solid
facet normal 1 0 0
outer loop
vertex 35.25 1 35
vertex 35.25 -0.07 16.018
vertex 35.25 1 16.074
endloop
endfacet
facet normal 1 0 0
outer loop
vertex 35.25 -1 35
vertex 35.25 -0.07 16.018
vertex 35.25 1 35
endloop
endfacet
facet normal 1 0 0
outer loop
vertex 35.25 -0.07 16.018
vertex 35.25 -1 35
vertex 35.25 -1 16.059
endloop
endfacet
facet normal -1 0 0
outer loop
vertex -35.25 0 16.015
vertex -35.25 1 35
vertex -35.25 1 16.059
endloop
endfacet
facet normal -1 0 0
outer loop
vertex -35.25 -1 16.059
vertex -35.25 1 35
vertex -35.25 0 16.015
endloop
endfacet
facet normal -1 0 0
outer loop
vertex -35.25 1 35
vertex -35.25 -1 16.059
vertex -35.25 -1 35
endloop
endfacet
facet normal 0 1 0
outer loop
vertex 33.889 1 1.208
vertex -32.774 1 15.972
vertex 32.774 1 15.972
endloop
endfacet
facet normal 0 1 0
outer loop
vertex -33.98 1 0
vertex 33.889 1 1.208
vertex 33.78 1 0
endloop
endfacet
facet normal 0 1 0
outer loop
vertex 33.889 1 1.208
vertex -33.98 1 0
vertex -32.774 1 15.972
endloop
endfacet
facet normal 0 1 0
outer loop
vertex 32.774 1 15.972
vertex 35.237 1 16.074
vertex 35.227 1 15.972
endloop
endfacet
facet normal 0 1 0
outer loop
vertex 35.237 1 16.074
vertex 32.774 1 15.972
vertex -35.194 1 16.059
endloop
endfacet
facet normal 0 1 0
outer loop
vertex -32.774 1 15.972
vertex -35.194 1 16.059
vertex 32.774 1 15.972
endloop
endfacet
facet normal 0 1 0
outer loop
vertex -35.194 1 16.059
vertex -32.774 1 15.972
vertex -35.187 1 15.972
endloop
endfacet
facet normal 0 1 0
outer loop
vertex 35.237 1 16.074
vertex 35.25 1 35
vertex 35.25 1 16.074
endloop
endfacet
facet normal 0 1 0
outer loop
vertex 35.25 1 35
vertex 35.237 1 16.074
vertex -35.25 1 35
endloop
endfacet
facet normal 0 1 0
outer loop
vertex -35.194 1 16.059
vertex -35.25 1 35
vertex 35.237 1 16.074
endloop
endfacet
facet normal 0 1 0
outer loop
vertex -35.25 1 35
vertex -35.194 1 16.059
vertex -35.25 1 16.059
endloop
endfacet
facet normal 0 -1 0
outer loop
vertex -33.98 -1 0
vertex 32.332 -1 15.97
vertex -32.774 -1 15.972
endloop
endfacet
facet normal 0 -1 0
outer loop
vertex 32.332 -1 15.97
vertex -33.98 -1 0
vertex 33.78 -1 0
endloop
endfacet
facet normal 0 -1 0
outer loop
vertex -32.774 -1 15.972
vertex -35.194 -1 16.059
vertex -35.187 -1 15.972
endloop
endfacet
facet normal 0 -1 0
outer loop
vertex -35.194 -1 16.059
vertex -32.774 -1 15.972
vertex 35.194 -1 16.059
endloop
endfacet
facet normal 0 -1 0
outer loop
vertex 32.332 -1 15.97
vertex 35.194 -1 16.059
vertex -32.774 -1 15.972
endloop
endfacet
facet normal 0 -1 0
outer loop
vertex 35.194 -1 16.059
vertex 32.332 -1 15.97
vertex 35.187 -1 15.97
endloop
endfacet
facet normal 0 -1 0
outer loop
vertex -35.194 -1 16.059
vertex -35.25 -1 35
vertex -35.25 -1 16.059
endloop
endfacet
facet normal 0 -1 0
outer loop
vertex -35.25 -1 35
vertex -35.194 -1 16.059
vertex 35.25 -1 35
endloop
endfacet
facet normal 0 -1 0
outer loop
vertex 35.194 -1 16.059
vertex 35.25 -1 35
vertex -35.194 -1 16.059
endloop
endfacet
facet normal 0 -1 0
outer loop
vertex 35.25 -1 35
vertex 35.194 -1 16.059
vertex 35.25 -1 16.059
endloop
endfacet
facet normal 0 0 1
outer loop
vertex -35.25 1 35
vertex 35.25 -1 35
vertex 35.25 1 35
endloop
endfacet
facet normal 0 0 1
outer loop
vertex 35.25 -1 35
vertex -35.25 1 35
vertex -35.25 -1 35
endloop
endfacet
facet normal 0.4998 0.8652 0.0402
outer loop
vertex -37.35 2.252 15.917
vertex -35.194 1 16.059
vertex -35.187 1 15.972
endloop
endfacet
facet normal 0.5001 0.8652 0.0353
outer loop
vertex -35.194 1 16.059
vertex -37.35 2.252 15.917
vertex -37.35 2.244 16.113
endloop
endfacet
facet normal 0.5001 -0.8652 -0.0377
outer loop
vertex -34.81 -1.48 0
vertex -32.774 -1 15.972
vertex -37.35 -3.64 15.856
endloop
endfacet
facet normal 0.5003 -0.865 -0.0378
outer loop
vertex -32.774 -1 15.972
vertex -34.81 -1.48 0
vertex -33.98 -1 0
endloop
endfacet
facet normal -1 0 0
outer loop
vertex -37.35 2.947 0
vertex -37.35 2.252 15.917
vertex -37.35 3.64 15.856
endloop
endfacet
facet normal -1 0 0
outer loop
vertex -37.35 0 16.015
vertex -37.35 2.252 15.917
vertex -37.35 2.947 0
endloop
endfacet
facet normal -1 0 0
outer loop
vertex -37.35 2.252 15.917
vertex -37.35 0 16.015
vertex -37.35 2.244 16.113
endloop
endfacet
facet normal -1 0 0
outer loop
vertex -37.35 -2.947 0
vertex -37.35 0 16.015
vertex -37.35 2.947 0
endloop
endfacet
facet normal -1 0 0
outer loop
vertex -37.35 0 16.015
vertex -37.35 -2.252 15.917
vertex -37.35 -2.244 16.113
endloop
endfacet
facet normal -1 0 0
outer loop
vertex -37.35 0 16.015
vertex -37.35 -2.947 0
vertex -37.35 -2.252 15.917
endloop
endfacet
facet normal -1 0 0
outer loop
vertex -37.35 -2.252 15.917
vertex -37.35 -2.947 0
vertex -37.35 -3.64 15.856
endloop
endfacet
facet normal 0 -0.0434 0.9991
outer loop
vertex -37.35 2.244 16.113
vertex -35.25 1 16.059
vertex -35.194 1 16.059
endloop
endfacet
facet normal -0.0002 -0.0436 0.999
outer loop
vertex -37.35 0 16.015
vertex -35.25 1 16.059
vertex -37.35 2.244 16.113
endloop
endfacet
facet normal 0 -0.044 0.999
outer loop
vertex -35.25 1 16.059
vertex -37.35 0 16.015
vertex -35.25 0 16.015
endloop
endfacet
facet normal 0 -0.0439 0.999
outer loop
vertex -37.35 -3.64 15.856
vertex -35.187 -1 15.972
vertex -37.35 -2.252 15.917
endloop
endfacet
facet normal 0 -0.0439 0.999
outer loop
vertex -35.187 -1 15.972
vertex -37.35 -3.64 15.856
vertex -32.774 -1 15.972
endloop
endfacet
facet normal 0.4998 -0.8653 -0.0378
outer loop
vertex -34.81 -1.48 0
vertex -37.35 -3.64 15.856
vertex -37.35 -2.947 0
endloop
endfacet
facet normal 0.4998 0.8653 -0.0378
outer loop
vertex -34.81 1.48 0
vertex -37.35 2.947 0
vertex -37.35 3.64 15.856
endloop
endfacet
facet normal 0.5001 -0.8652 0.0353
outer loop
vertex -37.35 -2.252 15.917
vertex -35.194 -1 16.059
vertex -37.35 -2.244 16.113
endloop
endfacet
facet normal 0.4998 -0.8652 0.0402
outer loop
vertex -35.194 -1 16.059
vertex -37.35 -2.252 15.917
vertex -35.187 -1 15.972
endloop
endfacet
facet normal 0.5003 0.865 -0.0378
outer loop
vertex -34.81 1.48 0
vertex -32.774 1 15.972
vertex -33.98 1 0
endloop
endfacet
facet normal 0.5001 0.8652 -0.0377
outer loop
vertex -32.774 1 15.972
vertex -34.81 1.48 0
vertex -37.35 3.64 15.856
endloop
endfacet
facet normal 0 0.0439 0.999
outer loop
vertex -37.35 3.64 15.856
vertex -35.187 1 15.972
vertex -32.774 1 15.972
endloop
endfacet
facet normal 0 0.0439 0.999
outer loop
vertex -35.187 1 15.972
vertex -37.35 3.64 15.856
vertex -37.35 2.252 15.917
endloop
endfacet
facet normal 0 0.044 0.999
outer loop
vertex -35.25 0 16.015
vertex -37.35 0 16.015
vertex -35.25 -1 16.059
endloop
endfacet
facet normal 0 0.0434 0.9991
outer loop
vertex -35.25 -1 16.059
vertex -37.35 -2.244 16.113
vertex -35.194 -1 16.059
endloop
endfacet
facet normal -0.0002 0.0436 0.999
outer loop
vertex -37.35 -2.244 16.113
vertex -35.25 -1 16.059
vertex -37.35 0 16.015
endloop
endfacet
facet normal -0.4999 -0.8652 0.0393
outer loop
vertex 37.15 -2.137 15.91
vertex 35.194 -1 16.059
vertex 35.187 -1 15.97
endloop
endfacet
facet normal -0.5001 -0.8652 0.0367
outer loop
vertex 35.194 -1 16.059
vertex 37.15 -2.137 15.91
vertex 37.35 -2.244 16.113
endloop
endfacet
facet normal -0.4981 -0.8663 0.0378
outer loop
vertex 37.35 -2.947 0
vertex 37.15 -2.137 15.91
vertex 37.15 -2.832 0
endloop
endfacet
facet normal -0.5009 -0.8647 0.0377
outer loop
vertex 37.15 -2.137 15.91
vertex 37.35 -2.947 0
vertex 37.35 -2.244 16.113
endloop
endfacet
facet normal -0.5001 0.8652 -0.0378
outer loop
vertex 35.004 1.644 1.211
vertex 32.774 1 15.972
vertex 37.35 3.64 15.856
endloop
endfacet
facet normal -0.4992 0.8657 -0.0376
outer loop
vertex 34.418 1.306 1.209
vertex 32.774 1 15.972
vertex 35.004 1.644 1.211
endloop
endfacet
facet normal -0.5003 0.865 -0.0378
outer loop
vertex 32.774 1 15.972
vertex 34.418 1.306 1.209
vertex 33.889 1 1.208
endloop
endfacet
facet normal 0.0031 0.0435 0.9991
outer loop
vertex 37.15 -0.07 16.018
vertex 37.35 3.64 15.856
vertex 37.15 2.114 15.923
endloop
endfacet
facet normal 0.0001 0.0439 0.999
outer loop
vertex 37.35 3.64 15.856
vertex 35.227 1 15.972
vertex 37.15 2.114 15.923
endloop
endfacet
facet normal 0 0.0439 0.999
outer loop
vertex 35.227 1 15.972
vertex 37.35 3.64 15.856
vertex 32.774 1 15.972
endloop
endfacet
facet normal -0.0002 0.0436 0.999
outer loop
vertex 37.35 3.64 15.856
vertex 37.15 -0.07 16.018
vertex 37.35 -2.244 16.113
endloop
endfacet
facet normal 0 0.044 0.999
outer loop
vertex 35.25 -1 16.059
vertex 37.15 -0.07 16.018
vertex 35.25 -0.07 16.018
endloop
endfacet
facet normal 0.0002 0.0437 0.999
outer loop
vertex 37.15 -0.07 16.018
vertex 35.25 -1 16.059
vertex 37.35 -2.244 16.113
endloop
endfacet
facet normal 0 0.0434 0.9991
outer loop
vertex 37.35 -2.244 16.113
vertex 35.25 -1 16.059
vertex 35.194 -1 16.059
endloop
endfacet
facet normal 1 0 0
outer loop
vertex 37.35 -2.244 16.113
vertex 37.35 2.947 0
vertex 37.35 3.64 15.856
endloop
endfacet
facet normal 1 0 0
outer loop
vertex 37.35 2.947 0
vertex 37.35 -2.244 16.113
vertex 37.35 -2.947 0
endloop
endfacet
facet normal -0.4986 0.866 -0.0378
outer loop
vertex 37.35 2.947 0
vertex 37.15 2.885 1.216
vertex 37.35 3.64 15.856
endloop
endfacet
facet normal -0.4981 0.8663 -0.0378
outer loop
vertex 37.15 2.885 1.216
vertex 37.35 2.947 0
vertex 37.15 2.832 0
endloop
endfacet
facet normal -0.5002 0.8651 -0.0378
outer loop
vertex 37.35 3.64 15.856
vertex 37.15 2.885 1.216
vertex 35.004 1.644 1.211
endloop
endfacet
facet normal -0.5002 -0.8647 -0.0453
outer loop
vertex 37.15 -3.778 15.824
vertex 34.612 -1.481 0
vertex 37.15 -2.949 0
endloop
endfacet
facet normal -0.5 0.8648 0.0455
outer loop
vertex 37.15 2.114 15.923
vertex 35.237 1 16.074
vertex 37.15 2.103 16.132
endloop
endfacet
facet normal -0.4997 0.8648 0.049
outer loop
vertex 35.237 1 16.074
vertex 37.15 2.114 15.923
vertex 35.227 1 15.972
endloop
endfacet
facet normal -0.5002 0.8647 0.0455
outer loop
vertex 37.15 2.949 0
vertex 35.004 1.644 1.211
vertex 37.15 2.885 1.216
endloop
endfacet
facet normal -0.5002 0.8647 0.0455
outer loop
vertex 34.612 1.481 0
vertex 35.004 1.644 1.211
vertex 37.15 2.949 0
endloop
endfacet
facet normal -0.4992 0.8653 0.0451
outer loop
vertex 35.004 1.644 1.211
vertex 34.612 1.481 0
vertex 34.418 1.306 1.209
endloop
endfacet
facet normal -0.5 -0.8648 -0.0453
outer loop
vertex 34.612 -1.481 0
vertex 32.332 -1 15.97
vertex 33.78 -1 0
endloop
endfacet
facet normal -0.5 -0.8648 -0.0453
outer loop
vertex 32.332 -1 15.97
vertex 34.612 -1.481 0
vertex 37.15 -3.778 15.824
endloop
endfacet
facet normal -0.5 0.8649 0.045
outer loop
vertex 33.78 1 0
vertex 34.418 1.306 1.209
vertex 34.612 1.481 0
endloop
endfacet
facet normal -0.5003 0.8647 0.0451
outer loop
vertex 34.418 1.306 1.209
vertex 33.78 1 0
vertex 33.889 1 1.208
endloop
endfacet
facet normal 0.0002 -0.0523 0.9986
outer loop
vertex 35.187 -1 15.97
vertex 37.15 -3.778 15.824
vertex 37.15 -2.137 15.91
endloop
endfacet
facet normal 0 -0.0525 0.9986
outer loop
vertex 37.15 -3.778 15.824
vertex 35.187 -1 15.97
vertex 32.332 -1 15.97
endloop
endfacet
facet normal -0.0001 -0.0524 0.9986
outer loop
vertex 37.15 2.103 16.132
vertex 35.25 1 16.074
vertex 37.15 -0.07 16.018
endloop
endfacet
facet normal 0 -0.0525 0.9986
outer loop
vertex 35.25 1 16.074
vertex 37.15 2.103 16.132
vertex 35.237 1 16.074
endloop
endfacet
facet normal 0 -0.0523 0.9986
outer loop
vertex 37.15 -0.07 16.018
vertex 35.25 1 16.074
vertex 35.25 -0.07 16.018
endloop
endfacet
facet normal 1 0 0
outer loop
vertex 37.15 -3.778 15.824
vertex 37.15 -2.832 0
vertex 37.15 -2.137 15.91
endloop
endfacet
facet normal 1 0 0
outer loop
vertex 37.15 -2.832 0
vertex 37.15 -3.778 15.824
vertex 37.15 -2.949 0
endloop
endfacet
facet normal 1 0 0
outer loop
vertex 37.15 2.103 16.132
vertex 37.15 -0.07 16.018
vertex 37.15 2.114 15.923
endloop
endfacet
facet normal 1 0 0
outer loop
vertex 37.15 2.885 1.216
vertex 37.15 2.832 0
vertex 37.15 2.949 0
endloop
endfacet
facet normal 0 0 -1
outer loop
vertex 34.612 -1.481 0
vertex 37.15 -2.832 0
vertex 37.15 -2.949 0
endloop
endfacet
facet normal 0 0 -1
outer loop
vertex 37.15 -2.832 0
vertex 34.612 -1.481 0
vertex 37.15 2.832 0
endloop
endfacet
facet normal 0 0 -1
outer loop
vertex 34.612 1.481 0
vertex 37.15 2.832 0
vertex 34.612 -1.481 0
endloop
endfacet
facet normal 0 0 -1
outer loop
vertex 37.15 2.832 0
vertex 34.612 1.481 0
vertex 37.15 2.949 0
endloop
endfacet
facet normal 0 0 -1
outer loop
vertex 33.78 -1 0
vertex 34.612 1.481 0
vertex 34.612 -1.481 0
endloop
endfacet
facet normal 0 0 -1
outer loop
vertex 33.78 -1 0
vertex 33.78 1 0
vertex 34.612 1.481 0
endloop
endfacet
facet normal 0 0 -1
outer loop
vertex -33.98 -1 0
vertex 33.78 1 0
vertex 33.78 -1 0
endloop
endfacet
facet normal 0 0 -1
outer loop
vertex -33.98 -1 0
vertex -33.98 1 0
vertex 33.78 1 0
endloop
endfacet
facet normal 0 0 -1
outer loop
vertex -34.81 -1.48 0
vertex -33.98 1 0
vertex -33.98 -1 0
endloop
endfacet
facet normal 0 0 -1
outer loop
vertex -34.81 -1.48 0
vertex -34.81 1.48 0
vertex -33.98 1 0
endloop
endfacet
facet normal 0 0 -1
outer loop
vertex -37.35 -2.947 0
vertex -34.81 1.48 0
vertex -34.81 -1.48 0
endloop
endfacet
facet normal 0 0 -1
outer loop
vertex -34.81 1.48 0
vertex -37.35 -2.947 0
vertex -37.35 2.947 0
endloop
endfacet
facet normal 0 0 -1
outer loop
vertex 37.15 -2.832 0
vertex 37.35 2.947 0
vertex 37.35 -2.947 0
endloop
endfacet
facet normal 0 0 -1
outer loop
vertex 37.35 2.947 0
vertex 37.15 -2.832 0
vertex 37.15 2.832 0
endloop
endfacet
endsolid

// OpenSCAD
/************** BEST VIEWED IN A CODE EDITOR 80 COLUMNS WIDE *******************
* Dewalt Case Dividers
* Benjamen Johnson <workshop.electronsmith.com>
* 20190309
* Version 2
* openSCAD Version: 2015.03-2
*******************************************************************************/

/*******************************************************************************
*      -----------------------------------   ------
*    \|                                   |/    |
*    /|                                   |\    |
*     |                                   |   width
*    \|                                   |/    | 
*    /|                                   |\    |
*      -----------------------------------   ------
*     |   <--------- length ---------->   |
*
*      -------------  -----    
*     |  :::   :::  |   |
*     |  :::   :::  |   |
*     |  :::   :::  | depth
*     |  :::   :::  |   | 
*     |  :::   :::  |   |
*      -------------  -----
*     | <- width -> | 
*
* Note: The dovetails are represented by colons. I'm ignoring that the
*       dovetails change in width for this diagram to make it simpler
*******************************************************************************/
// Length of insert not counting the dovetails (x direction)
length = 70.5;

// Width of insert (y direction)
width = 2;

// Depth of insert from the bottom of the case up(z direction)
depth = 16;

/*******************************************************************************
*    ---------   ---------  ---
*    \       /   \       /   |
*     \     /     \     /   dovetail_offset (offset from standard, not distance)
*      \   /       \   /     |
*    ---------------------- ---
*        | <--- ---> | -- dovetail_distance
*  --------------------------
*  |  :       :   :       :  |
*  |  :       :   :       :  | |   /
*  |   :     :     :     :   | |  /  <- dovetail_angle: the dovetails are wider
*  |   :     :     :     :   | | /      at the top than the bottom. They are 
*  |    :   :       :   :    | |/       defined by the with of the bottom and 
*  |    :   :       :   :    |          the angle.
*   ------------------------- 
*       |< >| -- dovetail_width_bottom
*
*******************************************************************************/
// distance between the dovetails
dovetail_distance = 0;

// width of the bottom part of the dovetail
dovetail_width_bottom = 6.8;

// the taper angle of the dovetails (bottom narrower than top)
dovetail_angle = 2.5;

// an adjustment for moving the dovetails in or out
dovetail_offset = 0.4;

/*******************************************************************************
* Custom parameters for the divder insert
*******************************************************************************/
// Divider height -- how high the divider extends above the insert (z direction)
divider_height = 19;

difference(){
    union(){
        //Create main body
        cube([length,width,depth*2],center=true);
            
        //Create upper divider
        translate([0,0,depth+divider_height/2])cube([length,width,divider_height],center=true);
            
        //Create dovetails
        translate([-length/2-dovetail_offset,dovetail_distance/2,0])rotate([dovetail_angle,0,0])cylinder(d=dovetail_width_bottom,h=depth*2,center=true,$fn=3);
        translate([-length/2-dovetail_offset,dovetail_distance/2,0])rotate([-dovetail_angle,0,0])cylinder(d=dovetail_width_bottom,h=depth*2,center=true,$fn=3);
            
        translate([length/2+dovetail_offset,dovetail_distance/2,0])rotate([dovetail_angle,0,180])cylinder(d=dovetail_width_bottom,h=depth*2,center=true,$fn=3);
        translate([length/2+0.2,dovetail_distance/2,0])rotate([-3,0,180])cylinder(d=dovetail_width_bottom,h=depth*2,center=true,$fn=3);
    } // end union
     
    // erase bottom half
    translate([0,0,-(depth+10)/2]) cube([length+10,width+10,depth+10],center=true);
} // end difference
